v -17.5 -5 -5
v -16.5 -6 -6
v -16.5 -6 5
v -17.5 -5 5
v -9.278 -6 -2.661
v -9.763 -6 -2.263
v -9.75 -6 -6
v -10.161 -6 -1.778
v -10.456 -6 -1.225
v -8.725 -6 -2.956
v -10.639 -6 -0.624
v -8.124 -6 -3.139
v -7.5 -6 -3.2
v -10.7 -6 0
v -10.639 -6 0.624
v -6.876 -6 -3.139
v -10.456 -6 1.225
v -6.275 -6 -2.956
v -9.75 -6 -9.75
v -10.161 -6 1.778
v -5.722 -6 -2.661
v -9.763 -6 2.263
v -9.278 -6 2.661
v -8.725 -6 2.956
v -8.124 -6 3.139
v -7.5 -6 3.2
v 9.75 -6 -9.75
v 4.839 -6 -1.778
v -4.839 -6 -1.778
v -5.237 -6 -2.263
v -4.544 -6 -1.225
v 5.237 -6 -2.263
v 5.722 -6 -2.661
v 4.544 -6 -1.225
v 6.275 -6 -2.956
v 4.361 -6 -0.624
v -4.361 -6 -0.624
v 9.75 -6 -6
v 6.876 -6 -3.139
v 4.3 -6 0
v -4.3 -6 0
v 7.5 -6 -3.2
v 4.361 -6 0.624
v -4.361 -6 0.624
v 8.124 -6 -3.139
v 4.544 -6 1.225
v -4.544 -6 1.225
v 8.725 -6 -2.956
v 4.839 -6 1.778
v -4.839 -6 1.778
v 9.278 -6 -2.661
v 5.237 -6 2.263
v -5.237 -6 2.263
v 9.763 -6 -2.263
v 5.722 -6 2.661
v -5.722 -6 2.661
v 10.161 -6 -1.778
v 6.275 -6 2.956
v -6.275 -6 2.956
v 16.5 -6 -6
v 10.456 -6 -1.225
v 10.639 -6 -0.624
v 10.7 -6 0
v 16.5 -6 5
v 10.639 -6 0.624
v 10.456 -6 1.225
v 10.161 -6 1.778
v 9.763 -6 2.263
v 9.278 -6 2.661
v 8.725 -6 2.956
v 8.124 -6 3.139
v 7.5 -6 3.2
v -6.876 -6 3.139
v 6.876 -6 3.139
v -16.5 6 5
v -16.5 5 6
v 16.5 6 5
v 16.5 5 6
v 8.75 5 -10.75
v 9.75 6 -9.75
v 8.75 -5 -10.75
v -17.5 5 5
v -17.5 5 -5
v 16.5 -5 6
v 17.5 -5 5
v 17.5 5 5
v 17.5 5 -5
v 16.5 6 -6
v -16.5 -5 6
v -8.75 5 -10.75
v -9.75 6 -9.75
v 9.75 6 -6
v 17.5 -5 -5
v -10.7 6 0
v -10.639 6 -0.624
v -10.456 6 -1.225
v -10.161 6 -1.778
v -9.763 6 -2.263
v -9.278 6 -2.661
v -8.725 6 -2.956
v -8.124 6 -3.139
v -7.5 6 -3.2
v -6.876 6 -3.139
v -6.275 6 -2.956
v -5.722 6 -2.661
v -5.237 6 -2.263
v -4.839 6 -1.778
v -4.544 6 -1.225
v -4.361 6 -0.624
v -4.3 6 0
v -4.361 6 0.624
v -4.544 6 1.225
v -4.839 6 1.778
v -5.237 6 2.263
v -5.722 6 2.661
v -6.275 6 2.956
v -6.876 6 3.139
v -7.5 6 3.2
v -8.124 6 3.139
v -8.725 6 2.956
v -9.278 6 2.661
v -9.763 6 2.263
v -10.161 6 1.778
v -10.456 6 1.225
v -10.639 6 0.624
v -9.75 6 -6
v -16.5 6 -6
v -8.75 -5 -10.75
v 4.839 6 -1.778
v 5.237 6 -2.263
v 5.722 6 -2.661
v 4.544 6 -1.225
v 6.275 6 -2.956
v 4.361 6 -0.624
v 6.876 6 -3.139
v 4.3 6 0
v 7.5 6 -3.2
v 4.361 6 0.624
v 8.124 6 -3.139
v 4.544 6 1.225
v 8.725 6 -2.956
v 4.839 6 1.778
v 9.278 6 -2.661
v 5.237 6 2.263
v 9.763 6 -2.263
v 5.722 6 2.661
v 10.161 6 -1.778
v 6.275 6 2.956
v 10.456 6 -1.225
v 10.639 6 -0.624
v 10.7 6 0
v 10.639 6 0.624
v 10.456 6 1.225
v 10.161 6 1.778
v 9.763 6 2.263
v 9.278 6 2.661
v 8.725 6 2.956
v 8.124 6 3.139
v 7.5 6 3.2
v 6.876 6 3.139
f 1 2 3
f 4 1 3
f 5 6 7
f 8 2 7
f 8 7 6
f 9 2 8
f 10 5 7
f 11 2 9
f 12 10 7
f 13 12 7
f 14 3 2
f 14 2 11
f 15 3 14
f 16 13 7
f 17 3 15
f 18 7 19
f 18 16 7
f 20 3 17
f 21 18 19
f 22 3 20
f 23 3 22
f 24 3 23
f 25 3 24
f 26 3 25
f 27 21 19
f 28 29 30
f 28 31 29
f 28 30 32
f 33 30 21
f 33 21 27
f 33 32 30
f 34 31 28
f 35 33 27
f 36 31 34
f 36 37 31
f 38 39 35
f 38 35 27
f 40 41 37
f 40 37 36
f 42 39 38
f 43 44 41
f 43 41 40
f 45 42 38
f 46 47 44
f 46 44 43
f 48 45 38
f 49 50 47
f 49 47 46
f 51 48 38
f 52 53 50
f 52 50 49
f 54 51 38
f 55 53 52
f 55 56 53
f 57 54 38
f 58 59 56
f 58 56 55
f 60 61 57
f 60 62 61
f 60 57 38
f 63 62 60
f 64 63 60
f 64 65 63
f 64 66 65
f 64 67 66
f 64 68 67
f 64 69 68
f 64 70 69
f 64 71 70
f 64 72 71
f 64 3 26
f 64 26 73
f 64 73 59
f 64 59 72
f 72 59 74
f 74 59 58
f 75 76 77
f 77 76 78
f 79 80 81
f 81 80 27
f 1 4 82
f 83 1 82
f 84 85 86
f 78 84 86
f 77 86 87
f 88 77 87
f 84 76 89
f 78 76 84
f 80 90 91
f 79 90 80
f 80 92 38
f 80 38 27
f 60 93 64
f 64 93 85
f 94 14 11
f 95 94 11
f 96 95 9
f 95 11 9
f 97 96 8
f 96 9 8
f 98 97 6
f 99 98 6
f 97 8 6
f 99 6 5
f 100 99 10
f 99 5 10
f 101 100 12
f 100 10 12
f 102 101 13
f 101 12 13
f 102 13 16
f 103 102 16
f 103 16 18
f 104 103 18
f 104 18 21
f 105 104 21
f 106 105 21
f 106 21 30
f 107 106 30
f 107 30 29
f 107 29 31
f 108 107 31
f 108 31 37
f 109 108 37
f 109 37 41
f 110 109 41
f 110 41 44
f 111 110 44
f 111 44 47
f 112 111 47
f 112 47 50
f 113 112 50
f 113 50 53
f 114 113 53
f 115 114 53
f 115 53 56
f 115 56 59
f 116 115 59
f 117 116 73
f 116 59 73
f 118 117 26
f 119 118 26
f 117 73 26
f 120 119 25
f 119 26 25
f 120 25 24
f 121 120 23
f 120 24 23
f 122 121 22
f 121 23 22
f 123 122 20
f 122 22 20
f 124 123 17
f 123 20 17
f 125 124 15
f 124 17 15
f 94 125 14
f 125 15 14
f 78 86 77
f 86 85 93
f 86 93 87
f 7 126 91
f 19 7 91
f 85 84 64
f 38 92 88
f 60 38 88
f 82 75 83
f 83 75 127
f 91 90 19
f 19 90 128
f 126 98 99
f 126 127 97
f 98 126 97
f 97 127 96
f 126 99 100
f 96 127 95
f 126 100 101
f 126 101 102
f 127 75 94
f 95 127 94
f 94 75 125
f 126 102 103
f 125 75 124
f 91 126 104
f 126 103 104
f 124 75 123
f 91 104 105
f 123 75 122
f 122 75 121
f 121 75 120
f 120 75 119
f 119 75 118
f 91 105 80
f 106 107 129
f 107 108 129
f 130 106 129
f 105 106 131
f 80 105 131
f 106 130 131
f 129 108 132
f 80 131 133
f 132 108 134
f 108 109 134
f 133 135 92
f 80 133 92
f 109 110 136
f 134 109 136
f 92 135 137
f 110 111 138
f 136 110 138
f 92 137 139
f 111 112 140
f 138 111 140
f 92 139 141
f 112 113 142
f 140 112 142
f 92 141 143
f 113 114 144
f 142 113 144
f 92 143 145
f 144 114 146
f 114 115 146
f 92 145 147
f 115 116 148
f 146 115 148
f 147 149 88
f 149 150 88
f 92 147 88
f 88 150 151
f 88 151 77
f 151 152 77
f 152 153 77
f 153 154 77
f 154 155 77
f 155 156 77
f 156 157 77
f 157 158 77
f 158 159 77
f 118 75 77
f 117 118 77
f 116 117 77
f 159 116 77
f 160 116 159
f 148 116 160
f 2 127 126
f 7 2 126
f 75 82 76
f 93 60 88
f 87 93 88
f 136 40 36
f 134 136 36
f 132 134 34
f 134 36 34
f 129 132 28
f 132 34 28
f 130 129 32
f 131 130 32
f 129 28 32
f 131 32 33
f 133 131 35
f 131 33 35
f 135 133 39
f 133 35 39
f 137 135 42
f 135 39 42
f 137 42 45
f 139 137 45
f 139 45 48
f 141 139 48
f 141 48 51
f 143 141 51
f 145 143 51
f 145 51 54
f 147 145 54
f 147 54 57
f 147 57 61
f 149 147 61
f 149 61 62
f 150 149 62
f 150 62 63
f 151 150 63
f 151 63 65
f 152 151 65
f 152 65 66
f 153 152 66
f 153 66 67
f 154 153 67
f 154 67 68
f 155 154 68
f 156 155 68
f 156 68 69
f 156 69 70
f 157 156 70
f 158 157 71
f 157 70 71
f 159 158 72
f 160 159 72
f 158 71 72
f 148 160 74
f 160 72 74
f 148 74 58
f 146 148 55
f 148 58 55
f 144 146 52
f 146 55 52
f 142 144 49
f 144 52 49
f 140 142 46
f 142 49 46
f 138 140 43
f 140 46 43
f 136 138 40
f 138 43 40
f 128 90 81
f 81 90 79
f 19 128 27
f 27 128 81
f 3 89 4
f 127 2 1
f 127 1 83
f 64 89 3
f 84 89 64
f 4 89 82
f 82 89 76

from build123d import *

# Parameters (mm, degrees)
SKETCH1_W            = 35
SKETCH1_H            = 12
BOSS_EXTRUDE1_DEPTH  = 6
SKETCH3_W            = 19.5
SKETCH3_H            = 4.75
BOSS_EXTRUDE2_DEPTH  = 12
M6_CLEARANCE_HOLE1_D = 6.4
CHAMFER4_SIZE        = 1


with BuildPart() as part:
    # Sketch1 → Boss-Extrude1 (new, symmetric)
    with BuildSketch(Plane.XY):
        Rectangle(SKETCH1_W, SKETCH1_H)
    extrude(amount=BOSS_EXTRUDE1_DEPTH, both=True)

    # Sketch3 → Boss-Extrude2 (add)
    with BuildSketch(Plane(origin=(0, 6, 0), x_dir=(1, 0, 0), z_dir=(0, 1, 0))):
        with Locations((0, 8.375)):
            Rectangle(SKETCH3_W, SKETCH3_H)
    extrude(amount=-BOSS_EXTRUDE2_DEPTH)

    # M6 Clearance Hole1 (through all)
    with Locations(Plane(origin=(0, 6, 0), x_dir=(1, 0, 0), z_dir=(0, 1, 0))):
        with Locations((-7.5, 0), (7.5, 0)):
            Hole(M6_CLEARANCE_HOLE1_D / 2)

    # Chamfer4
    chamfer4_edges = [part.edges().sort_by_distance(p)[0] for p in [
        (-17.5, 0, 6),
        (0, -6, 6),
        (-9.75, 0, -10.75),
        (9.75, 0, -10.75),
        (0, 6, -10.75),
        (0, -6, -10.75),
        (17.5, 0, 6),
        (-17.5, 0, -6),
        (17.5, 0, -6),
        (17.5, -6, 0),
        (-17.5, -6, 0),
        (-17.5, 6, 0),
        (17.5, 6, 0),
        (0, 6, 6),
    ]]
    chamfer(chamfer4_edges, length=CHAMFER4_SIZE)


solid = part.part
